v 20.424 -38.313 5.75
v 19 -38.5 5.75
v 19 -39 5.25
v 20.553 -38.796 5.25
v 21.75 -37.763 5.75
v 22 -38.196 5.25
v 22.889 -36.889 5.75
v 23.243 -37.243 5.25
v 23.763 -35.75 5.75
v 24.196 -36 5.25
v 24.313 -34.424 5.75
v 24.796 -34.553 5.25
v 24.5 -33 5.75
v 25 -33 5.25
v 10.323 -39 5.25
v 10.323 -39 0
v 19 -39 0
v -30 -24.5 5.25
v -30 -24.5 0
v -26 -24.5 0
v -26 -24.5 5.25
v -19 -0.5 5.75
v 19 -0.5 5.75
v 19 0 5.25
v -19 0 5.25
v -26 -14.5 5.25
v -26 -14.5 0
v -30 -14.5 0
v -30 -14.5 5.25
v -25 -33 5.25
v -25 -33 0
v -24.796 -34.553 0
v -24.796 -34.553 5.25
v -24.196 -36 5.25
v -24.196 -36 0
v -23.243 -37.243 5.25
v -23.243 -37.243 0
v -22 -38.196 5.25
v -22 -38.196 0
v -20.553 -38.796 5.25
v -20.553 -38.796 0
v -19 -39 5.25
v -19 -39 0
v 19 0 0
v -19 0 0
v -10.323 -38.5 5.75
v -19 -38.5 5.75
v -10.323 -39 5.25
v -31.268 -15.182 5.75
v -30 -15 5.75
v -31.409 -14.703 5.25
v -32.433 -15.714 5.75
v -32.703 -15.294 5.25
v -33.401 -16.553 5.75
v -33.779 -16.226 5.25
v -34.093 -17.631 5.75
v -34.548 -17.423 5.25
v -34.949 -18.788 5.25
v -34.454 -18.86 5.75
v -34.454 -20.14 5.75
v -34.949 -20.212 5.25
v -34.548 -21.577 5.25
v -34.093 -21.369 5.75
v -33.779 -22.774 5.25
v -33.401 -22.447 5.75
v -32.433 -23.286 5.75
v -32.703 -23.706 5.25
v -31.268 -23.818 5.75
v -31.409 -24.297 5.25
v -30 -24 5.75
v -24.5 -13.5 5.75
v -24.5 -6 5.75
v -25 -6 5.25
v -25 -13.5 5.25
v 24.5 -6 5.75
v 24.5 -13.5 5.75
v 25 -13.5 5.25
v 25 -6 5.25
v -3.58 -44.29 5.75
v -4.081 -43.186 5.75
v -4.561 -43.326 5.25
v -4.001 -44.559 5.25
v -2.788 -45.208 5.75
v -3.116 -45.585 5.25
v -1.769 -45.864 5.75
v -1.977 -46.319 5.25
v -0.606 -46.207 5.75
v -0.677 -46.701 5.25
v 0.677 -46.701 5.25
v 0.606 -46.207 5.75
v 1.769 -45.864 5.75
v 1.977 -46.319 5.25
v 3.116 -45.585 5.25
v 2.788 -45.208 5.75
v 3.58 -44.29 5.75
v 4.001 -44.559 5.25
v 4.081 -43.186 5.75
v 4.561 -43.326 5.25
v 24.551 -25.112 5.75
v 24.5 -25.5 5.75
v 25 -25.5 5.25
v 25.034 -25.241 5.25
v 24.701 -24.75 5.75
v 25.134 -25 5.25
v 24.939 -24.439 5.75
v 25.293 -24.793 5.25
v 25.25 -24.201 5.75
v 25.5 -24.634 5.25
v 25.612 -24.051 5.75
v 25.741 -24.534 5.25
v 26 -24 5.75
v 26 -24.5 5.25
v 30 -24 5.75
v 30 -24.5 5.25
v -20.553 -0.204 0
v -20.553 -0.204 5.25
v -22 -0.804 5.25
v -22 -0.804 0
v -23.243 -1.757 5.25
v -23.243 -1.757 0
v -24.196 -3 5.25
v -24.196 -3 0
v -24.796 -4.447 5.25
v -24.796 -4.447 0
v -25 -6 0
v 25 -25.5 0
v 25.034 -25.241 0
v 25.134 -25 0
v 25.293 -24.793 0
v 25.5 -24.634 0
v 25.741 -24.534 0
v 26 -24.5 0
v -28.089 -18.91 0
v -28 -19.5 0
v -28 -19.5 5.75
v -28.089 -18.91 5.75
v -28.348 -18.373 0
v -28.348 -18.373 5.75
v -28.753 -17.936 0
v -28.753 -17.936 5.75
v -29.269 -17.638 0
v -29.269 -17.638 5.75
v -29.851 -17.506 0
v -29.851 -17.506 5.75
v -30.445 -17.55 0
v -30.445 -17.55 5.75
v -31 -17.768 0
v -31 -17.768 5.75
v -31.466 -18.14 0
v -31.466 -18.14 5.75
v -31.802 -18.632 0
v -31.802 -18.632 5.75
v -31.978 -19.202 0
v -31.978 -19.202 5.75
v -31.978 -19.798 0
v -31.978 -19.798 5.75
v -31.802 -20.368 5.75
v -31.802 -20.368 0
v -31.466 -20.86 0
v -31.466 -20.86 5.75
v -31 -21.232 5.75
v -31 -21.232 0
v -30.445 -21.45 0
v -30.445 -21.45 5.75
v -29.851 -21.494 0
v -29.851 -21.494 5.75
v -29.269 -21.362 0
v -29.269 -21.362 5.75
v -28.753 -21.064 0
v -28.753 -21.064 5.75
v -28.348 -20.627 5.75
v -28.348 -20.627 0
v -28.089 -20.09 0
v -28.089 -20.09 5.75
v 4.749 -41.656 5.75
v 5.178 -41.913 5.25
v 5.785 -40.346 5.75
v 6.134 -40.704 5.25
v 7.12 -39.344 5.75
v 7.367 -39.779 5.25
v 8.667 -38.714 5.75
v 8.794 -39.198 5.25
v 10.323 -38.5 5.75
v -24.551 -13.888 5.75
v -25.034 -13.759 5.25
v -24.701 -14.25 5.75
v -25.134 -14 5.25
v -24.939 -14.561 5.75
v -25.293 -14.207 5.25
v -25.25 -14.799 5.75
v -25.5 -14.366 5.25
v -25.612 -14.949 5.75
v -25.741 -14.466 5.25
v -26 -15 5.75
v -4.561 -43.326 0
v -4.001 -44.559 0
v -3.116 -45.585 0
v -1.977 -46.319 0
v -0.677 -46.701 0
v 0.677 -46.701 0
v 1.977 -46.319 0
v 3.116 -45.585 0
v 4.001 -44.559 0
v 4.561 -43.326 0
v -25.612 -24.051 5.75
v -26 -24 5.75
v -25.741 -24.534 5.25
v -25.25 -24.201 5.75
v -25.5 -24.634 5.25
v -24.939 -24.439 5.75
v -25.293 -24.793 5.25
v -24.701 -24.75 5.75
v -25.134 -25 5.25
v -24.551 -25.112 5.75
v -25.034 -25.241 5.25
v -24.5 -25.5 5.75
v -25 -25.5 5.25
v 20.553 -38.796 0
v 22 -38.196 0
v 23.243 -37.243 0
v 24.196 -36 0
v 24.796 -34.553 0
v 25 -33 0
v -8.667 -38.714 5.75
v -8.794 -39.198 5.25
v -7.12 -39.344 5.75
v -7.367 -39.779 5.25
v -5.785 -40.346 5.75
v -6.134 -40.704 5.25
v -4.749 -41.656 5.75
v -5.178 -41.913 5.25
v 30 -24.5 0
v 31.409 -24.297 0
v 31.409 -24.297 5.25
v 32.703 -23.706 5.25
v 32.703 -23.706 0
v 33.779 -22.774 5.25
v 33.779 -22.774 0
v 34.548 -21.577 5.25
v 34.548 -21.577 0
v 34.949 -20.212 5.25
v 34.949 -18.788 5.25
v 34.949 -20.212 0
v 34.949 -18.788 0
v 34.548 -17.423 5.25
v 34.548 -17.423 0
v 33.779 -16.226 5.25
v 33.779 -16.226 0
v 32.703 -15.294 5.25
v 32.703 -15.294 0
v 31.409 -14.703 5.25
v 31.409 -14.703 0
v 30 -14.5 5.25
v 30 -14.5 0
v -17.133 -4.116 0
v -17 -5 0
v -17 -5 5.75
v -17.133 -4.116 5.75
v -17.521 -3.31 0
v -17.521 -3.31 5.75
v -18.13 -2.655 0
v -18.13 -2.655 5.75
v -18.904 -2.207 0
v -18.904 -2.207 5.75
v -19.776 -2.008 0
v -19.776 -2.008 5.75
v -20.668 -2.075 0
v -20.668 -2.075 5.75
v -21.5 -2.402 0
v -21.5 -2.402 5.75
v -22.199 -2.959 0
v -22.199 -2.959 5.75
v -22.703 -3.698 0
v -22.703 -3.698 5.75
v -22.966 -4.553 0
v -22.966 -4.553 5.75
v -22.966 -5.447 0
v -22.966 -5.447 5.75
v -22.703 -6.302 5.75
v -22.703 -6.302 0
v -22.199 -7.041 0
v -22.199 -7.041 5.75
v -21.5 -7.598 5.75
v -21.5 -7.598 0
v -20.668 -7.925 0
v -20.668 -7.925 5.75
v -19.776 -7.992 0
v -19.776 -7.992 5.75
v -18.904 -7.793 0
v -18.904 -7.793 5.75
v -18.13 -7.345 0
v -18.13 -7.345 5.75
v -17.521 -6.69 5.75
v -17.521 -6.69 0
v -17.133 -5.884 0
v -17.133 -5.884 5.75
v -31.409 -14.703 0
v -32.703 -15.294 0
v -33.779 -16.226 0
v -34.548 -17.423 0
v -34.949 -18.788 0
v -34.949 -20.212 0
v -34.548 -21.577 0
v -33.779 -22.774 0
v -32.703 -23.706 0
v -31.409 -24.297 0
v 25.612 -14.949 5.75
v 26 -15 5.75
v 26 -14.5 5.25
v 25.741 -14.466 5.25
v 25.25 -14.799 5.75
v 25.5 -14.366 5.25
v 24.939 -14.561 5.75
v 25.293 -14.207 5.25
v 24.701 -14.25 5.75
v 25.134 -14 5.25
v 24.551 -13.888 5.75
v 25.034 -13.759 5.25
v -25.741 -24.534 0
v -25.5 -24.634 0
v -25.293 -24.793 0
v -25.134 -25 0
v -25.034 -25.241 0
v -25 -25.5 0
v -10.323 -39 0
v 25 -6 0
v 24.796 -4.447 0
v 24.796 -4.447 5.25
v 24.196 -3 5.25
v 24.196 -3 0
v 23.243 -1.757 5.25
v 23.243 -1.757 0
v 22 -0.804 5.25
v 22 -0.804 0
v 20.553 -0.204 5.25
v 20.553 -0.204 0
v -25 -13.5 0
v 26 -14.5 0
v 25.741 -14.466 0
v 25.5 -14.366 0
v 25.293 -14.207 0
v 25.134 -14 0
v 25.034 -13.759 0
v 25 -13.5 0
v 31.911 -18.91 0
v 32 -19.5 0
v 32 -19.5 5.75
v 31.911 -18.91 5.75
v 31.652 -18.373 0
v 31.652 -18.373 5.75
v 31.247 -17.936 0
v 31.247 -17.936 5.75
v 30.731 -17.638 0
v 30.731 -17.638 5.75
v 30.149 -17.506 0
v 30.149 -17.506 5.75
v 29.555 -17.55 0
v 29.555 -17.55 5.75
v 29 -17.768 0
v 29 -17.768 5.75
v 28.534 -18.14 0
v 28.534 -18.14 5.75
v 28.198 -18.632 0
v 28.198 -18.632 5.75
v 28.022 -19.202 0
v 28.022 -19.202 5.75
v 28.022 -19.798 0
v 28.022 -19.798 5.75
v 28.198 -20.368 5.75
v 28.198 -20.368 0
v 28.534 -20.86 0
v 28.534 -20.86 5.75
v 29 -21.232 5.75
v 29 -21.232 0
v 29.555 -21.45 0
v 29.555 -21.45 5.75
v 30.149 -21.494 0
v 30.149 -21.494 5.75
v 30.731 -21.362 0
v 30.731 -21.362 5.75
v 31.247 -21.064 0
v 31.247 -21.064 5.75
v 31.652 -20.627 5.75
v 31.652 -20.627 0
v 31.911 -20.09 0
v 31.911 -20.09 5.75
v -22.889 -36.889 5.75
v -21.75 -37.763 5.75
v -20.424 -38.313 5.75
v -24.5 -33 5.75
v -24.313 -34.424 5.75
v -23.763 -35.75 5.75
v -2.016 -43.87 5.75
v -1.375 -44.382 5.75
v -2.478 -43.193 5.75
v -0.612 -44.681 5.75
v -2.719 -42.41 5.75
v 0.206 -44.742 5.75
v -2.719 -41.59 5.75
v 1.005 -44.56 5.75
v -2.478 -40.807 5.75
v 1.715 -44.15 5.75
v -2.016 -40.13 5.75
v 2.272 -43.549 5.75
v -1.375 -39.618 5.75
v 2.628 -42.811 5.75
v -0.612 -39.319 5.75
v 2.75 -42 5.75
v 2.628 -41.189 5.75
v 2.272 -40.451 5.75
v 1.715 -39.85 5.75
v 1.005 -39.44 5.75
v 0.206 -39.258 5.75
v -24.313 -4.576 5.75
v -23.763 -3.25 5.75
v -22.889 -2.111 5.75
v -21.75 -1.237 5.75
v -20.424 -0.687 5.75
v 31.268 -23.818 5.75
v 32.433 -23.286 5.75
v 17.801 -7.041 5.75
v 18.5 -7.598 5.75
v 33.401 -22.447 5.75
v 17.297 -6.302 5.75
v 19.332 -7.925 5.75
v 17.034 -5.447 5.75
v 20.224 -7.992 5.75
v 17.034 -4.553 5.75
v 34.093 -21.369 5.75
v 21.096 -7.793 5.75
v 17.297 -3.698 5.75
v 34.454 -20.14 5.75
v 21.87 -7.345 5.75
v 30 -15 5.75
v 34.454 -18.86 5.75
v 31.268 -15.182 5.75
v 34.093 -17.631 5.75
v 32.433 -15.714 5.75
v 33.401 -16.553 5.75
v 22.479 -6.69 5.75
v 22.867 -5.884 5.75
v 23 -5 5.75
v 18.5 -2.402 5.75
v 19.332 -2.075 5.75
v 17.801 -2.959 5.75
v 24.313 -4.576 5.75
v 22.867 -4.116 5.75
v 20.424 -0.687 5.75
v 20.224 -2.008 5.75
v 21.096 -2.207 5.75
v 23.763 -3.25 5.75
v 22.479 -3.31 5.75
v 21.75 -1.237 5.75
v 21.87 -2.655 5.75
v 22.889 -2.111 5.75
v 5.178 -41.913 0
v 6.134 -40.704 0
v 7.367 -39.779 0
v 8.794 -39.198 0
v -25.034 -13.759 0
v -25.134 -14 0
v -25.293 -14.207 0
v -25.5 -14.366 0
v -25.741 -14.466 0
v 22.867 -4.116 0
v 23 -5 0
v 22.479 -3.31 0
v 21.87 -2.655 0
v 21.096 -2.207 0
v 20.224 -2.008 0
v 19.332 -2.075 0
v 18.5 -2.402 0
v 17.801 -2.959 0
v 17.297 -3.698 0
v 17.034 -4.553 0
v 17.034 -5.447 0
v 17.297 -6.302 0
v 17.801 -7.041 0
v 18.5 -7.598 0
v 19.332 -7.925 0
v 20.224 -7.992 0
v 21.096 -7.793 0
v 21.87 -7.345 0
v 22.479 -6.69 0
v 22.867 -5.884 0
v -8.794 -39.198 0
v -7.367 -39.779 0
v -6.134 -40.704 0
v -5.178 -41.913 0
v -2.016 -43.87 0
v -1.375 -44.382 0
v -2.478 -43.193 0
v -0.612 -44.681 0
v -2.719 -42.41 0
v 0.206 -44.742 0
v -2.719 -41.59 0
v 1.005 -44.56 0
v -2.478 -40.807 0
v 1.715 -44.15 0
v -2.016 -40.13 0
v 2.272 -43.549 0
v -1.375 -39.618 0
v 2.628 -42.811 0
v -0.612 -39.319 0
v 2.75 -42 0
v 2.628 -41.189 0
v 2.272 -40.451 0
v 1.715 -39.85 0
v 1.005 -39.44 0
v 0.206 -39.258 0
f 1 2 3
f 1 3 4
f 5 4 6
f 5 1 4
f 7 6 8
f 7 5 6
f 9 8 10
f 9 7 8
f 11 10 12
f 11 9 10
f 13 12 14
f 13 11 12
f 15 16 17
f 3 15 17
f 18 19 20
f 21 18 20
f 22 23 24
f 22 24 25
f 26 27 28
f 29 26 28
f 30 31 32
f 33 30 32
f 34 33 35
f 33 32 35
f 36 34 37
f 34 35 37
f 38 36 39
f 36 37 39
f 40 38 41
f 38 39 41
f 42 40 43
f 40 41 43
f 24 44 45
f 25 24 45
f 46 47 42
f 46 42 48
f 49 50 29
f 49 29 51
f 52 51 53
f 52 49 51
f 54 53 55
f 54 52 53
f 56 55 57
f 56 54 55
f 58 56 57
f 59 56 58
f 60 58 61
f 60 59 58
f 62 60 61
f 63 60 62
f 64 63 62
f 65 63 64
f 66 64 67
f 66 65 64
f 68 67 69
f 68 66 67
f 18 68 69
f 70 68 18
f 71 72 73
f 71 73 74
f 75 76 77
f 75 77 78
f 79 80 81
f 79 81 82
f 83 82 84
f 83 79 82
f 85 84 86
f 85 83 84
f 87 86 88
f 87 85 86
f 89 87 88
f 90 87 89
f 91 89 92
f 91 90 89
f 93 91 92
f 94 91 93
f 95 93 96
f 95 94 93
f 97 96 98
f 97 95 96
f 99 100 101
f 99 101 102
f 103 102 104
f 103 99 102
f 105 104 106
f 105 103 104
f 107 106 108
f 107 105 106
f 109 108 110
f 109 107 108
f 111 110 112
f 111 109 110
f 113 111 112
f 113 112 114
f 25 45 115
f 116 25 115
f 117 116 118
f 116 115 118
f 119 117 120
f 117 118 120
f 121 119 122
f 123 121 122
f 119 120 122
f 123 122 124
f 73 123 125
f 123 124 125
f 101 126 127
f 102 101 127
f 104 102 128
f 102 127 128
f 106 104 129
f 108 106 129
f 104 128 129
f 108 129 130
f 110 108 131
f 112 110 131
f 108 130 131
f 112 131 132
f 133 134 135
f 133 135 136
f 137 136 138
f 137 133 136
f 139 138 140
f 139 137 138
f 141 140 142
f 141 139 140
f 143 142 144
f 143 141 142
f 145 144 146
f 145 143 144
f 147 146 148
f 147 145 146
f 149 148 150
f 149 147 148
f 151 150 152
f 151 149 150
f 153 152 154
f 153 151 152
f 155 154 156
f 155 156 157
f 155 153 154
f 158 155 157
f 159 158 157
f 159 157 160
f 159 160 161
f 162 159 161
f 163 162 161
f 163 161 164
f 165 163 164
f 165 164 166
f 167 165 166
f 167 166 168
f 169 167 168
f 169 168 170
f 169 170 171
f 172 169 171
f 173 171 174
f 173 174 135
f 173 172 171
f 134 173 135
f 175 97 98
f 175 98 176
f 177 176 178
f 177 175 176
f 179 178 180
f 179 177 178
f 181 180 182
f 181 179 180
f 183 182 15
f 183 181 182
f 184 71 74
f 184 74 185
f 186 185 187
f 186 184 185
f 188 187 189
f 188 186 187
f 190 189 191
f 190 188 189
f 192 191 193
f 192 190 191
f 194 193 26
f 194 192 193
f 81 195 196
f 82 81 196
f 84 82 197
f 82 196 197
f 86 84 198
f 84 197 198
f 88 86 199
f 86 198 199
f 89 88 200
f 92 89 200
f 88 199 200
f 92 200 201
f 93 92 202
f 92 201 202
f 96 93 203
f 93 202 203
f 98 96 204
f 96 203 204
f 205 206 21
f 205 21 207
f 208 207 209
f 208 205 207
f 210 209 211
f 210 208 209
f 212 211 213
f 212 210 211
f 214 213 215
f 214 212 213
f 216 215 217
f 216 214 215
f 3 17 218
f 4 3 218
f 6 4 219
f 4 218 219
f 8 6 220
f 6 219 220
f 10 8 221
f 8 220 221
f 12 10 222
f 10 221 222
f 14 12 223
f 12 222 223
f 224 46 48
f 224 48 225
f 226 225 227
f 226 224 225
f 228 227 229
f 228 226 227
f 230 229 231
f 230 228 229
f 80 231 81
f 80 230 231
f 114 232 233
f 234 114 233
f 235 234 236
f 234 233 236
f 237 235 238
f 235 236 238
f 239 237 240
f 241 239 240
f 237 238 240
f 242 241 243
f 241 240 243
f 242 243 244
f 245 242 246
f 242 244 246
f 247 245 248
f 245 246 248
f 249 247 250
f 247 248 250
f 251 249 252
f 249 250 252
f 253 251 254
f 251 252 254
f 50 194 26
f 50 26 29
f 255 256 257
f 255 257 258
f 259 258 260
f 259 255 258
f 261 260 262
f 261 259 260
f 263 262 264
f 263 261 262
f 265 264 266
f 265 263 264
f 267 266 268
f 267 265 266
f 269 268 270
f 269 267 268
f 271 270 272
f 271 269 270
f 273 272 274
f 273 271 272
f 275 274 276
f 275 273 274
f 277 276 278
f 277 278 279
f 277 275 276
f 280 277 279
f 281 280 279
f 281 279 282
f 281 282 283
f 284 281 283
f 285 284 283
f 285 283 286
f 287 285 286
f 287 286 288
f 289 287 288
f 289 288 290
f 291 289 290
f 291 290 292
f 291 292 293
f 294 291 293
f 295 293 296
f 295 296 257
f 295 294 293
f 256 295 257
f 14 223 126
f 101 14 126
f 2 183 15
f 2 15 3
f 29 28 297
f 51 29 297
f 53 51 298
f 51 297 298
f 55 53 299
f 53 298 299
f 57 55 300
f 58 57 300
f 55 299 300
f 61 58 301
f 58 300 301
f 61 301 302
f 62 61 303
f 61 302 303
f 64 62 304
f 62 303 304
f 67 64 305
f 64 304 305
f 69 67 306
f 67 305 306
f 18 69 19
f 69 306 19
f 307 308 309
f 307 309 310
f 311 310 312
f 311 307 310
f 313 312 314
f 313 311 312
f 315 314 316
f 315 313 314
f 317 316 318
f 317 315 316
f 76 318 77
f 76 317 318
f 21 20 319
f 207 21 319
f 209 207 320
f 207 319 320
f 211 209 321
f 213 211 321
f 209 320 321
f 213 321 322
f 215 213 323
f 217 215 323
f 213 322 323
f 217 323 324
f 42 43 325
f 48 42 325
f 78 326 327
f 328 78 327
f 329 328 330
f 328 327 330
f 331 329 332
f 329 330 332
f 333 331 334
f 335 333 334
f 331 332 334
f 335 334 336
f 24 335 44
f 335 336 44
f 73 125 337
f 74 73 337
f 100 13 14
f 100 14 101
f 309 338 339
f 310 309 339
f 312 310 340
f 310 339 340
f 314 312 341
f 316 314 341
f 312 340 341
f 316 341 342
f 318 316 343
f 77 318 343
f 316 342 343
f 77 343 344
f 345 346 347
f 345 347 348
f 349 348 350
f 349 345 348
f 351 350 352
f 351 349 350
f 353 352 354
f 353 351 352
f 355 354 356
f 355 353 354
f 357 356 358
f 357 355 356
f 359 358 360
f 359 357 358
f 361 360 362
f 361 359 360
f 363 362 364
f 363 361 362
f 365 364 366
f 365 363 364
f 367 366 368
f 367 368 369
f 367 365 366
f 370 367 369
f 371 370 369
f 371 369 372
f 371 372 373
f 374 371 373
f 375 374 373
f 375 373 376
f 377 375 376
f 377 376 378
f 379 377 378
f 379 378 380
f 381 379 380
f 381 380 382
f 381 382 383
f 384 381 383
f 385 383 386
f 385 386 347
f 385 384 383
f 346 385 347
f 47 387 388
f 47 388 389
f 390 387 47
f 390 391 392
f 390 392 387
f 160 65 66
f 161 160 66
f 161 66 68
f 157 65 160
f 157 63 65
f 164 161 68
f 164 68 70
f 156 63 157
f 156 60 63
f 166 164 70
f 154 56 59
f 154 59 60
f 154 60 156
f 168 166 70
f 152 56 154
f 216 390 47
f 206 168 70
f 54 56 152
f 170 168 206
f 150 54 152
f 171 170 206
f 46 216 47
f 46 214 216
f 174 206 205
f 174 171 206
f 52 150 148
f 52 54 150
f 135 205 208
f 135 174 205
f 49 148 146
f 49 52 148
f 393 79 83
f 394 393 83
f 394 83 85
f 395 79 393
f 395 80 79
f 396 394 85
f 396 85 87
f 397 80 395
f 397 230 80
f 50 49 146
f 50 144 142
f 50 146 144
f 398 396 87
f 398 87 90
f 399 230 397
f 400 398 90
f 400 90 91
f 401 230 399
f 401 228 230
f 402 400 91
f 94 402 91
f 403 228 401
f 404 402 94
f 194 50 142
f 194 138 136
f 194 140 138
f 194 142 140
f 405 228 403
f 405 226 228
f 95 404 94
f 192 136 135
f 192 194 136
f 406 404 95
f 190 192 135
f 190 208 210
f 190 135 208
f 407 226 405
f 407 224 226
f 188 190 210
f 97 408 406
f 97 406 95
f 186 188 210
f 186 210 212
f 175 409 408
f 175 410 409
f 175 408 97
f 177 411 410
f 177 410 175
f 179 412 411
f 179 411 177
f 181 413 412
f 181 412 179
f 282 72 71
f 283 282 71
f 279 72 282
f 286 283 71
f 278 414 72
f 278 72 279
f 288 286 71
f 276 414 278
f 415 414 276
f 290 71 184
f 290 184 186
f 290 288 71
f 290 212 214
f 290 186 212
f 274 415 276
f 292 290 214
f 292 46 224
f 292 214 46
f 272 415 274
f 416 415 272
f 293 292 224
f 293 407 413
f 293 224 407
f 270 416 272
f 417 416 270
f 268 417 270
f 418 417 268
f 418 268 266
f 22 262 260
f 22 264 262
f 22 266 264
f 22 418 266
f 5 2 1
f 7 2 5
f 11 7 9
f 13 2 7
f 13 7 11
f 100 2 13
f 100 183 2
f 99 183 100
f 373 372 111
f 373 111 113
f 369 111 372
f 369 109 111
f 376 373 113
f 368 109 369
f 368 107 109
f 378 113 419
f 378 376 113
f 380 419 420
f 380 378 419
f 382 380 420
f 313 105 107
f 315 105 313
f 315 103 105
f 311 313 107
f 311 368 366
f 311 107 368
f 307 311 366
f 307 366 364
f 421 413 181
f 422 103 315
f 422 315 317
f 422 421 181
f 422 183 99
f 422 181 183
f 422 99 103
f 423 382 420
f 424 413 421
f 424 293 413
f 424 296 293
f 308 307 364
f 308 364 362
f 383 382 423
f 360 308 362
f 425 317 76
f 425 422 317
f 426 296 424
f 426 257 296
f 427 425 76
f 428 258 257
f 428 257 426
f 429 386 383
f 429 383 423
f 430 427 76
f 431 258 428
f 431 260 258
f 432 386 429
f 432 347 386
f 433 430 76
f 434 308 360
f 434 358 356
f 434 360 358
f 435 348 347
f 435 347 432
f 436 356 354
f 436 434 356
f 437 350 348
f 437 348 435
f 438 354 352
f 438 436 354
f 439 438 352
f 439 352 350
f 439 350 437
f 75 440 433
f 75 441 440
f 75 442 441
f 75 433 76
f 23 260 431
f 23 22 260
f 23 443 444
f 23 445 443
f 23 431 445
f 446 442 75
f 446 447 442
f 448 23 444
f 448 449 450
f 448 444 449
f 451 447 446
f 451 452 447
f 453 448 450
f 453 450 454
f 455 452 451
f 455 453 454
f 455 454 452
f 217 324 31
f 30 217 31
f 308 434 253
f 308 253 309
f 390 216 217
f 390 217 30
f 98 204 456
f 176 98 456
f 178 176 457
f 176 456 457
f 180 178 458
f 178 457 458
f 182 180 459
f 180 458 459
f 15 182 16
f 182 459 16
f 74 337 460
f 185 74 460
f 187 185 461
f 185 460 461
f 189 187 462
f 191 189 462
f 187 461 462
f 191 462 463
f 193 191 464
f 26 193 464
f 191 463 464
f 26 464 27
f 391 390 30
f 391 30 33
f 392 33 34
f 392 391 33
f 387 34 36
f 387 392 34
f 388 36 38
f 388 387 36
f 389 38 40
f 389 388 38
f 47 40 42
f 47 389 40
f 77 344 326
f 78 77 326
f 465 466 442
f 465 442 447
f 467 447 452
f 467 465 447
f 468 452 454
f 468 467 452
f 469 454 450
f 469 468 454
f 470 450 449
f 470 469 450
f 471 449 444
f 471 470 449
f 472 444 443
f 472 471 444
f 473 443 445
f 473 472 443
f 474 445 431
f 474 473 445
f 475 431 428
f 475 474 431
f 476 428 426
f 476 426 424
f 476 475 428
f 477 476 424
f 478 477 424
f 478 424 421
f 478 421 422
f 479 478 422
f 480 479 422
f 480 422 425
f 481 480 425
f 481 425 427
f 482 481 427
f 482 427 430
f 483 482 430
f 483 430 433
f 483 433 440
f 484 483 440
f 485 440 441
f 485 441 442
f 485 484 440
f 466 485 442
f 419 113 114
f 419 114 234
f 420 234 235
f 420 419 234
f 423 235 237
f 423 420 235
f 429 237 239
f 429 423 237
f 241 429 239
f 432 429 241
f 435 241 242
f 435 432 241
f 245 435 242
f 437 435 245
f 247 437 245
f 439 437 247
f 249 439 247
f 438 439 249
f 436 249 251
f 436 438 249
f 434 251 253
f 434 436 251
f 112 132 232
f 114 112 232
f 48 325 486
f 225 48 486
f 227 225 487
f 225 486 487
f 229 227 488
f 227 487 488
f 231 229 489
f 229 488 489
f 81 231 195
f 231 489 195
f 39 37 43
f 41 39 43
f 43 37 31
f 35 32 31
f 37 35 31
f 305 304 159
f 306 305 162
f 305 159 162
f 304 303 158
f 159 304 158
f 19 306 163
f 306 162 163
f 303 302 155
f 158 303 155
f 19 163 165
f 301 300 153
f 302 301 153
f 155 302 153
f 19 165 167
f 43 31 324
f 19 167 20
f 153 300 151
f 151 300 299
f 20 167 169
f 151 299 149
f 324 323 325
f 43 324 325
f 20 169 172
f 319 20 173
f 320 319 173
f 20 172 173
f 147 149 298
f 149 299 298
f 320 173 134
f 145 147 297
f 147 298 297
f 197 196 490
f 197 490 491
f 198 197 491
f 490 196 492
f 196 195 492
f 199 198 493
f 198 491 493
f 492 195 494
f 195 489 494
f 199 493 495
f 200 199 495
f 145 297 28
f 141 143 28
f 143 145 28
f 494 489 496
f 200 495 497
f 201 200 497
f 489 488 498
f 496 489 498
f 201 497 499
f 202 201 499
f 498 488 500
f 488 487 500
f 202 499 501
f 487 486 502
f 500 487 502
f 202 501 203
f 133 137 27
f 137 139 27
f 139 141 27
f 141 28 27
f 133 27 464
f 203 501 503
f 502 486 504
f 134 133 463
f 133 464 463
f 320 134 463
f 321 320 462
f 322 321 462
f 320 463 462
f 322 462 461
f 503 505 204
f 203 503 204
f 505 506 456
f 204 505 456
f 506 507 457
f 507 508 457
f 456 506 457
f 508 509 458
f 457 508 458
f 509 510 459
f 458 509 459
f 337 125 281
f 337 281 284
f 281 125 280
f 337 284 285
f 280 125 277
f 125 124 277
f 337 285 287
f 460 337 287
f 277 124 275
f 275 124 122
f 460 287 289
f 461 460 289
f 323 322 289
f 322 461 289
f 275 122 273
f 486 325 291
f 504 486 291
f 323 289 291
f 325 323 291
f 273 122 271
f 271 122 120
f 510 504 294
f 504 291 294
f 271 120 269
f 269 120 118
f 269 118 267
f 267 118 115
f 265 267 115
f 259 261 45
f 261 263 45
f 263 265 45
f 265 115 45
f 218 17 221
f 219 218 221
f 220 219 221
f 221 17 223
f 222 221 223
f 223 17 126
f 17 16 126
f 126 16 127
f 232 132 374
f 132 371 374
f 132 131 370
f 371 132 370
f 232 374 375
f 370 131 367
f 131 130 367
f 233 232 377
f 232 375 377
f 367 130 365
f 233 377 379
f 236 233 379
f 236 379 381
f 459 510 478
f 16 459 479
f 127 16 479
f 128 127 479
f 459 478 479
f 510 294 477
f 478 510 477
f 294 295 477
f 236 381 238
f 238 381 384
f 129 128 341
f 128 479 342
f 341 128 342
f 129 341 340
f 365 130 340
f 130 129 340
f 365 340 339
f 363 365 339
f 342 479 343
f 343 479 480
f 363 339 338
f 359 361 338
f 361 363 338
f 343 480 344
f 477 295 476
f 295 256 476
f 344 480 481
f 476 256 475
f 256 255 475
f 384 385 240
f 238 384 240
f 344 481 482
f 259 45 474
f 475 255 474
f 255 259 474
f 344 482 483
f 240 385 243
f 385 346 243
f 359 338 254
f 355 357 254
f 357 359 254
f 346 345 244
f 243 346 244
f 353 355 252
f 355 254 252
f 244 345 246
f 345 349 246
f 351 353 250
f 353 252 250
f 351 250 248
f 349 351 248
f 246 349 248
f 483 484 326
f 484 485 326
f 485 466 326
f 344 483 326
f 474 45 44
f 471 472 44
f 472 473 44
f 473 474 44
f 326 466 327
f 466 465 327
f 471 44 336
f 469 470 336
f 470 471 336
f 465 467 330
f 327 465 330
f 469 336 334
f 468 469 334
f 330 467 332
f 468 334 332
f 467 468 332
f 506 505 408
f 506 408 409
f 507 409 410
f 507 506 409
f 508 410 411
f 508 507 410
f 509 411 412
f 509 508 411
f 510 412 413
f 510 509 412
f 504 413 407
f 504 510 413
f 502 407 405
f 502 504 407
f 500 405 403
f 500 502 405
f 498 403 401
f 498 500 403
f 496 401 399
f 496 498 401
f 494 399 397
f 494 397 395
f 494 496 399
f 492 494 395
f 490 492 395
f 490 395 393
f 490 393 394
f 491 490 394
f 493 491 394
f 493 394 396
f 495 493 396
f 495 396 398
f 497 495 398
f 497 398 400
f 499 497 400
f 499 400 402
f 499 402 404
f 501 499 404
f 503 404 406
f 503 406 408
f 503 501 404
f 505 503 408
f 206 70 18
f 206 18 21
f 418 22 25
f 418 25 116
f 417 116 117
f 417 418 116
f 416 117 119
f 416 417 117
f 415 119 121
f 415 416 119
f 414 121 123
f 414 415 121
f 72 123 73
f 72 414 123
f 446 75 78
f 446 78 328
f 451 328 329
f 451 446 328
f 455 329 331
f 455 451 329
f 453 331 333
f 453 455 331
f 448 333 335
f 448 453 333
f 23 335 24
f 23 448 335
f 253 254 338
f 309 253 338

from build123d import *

# Parameters (mm, degrees)
SKETCH1_R           = 3
SKETCH1_R_2         = 2
SKETCH1_R_3         = 2.75
BOSS_EXTRUDE1_DEPTH = 5.75
CHAMFER1_SIZE       = 0.5


with BuildPart() as part:
    # Sketch1 → Boss-Extrude1 (new body)
    with BuildSketch(Plane.XY):
        with BuildLine():
            Line((19, 0), (-19, 0))
            ThreePointArc((-19, 0), (-23.242640687, -1.757359313), (-25, -6))
            Line((-25, -6), (-25, -13.5))
            ThreePointArc((-25, -13.5), (-25.292893219, -14.207106781), (-26, -14.5))
            Line((-26, -14.5), (-30, -14.5))
            ThreePointArc((-30, -14.5), (-35, -19.5), (-30, -24.5))
            Line((-30, -24.5), (-26, -24.5))
            ThreePointArc((-26, -24.5), (-25.292893219, -24.792893219), (-25, -25.5))
            Line((-25, -25.5), (-25, -33))
            ThreePointArc((-25, -33), (-23.242640687, -37.242640687), (-19, -39))
            Line((-19, -39), (-10.322911411, -39))
            ThreePointArc((-10.322911411, -39), (-6.72058658, -40.201744503), (-4.561286437, -43.325581395))
            ThreePointArc((-4.561286437, -43.325581395), (0, -46.75), (4.561286437, -43.325581395))
            ThreePointArc((4.561286437, -43.325581395), (6.72058658, -40.201744503), (10.322911411, -39))
            Line((10.322911411, -39), (19, -39))
            ThreePointArc((19, -39), (23.242640687, -37.242640687), (25, -33))
            Line((25, -33), (25, -25.5))
            ThreePointArc((25, -25.5), (25.292893219, -24.792893219), (26, -24.5))
            Line((26, -24.5), (30, -24.5))
            ThreePointArc((30, -24.5), (35, -19.5), (30, -14.5))
            Line((30, -14.5), (26, -14.5))
            ThreePointArc((26, -14.5), (25.292893219, -14.207106781), (25, -13.5))
            Line((25, -13.5), (25, -6))
            ThreePointArc((25, -6), (23.242640687, -1.757359313), (19, 0))
        make_face()
        with Locations((20, -5)):
            Circle(SKETCH1_R, mode=Mode.SUBTRACT)
        with Locations((30, -19.5)):
            Circle(SKETCH1_R_2, mode=Mode.SUBTRACT)
        with Locations((-30, -19.5)):
            Circle(SKETCH1_R_2, mode=Mode.SUBTRACT)
        with Locations((0, -42)):
            Circle(SKETCH1_R_3, mode=Mode.SUBTRACT)
        with Locations((-20, -5)):
            Circle(SKETCH1_R, mode=Mode.SUBTRACT)
    extrude(amount=BOSS_EXTRUDE1_DEPTH)

    # Chamfer1
    chamfer1_edges = [part.edges().sort_by_distance(p)[0] for p in [
        (35, -19.5, 5.75),
        (28, -14.5, 5.75),
        (25.292893219, -14.207106781, 5.75),
        (25, -9.75, 5.75),
        (23.242640687, -1.757359313, 5.75),
        (0, 0, 5.75),
        (-23.242640687, -1.757359313, 5.75),
        (-25, -9.75, 5.75),
        (-25.292893219, -14.207106781, 5.75),
        (-28, -14.5, 5.75),
        (-35, -19.5, 5.75),
        (-28, -24.5, 5.75),
        (-25.292893219, -24.792893219, 5.75),
        (-25, -29.25, 5.75),
        (-23.242640687, -37.242640687, 5.75),
        (-14.661455706, -39, 5.75),
        (-6.72058658, -40.201744503, 5.75),
        (0, -46.75, 5.75),
        (6.72058658, -40.201744503, 5.75),
        (14.661455706, -39, 5.75),
        (23.242640687, -37.242640687, 5.75),
        (25, -29.25, 5.75),
        (25.292893219, -24.792893219, 5.75),
        (28, -24.5, 5.75),
    ]]
    chamfer(chamfer1_edges, length=CHAMFER1_SIZE)


solid = part.part
